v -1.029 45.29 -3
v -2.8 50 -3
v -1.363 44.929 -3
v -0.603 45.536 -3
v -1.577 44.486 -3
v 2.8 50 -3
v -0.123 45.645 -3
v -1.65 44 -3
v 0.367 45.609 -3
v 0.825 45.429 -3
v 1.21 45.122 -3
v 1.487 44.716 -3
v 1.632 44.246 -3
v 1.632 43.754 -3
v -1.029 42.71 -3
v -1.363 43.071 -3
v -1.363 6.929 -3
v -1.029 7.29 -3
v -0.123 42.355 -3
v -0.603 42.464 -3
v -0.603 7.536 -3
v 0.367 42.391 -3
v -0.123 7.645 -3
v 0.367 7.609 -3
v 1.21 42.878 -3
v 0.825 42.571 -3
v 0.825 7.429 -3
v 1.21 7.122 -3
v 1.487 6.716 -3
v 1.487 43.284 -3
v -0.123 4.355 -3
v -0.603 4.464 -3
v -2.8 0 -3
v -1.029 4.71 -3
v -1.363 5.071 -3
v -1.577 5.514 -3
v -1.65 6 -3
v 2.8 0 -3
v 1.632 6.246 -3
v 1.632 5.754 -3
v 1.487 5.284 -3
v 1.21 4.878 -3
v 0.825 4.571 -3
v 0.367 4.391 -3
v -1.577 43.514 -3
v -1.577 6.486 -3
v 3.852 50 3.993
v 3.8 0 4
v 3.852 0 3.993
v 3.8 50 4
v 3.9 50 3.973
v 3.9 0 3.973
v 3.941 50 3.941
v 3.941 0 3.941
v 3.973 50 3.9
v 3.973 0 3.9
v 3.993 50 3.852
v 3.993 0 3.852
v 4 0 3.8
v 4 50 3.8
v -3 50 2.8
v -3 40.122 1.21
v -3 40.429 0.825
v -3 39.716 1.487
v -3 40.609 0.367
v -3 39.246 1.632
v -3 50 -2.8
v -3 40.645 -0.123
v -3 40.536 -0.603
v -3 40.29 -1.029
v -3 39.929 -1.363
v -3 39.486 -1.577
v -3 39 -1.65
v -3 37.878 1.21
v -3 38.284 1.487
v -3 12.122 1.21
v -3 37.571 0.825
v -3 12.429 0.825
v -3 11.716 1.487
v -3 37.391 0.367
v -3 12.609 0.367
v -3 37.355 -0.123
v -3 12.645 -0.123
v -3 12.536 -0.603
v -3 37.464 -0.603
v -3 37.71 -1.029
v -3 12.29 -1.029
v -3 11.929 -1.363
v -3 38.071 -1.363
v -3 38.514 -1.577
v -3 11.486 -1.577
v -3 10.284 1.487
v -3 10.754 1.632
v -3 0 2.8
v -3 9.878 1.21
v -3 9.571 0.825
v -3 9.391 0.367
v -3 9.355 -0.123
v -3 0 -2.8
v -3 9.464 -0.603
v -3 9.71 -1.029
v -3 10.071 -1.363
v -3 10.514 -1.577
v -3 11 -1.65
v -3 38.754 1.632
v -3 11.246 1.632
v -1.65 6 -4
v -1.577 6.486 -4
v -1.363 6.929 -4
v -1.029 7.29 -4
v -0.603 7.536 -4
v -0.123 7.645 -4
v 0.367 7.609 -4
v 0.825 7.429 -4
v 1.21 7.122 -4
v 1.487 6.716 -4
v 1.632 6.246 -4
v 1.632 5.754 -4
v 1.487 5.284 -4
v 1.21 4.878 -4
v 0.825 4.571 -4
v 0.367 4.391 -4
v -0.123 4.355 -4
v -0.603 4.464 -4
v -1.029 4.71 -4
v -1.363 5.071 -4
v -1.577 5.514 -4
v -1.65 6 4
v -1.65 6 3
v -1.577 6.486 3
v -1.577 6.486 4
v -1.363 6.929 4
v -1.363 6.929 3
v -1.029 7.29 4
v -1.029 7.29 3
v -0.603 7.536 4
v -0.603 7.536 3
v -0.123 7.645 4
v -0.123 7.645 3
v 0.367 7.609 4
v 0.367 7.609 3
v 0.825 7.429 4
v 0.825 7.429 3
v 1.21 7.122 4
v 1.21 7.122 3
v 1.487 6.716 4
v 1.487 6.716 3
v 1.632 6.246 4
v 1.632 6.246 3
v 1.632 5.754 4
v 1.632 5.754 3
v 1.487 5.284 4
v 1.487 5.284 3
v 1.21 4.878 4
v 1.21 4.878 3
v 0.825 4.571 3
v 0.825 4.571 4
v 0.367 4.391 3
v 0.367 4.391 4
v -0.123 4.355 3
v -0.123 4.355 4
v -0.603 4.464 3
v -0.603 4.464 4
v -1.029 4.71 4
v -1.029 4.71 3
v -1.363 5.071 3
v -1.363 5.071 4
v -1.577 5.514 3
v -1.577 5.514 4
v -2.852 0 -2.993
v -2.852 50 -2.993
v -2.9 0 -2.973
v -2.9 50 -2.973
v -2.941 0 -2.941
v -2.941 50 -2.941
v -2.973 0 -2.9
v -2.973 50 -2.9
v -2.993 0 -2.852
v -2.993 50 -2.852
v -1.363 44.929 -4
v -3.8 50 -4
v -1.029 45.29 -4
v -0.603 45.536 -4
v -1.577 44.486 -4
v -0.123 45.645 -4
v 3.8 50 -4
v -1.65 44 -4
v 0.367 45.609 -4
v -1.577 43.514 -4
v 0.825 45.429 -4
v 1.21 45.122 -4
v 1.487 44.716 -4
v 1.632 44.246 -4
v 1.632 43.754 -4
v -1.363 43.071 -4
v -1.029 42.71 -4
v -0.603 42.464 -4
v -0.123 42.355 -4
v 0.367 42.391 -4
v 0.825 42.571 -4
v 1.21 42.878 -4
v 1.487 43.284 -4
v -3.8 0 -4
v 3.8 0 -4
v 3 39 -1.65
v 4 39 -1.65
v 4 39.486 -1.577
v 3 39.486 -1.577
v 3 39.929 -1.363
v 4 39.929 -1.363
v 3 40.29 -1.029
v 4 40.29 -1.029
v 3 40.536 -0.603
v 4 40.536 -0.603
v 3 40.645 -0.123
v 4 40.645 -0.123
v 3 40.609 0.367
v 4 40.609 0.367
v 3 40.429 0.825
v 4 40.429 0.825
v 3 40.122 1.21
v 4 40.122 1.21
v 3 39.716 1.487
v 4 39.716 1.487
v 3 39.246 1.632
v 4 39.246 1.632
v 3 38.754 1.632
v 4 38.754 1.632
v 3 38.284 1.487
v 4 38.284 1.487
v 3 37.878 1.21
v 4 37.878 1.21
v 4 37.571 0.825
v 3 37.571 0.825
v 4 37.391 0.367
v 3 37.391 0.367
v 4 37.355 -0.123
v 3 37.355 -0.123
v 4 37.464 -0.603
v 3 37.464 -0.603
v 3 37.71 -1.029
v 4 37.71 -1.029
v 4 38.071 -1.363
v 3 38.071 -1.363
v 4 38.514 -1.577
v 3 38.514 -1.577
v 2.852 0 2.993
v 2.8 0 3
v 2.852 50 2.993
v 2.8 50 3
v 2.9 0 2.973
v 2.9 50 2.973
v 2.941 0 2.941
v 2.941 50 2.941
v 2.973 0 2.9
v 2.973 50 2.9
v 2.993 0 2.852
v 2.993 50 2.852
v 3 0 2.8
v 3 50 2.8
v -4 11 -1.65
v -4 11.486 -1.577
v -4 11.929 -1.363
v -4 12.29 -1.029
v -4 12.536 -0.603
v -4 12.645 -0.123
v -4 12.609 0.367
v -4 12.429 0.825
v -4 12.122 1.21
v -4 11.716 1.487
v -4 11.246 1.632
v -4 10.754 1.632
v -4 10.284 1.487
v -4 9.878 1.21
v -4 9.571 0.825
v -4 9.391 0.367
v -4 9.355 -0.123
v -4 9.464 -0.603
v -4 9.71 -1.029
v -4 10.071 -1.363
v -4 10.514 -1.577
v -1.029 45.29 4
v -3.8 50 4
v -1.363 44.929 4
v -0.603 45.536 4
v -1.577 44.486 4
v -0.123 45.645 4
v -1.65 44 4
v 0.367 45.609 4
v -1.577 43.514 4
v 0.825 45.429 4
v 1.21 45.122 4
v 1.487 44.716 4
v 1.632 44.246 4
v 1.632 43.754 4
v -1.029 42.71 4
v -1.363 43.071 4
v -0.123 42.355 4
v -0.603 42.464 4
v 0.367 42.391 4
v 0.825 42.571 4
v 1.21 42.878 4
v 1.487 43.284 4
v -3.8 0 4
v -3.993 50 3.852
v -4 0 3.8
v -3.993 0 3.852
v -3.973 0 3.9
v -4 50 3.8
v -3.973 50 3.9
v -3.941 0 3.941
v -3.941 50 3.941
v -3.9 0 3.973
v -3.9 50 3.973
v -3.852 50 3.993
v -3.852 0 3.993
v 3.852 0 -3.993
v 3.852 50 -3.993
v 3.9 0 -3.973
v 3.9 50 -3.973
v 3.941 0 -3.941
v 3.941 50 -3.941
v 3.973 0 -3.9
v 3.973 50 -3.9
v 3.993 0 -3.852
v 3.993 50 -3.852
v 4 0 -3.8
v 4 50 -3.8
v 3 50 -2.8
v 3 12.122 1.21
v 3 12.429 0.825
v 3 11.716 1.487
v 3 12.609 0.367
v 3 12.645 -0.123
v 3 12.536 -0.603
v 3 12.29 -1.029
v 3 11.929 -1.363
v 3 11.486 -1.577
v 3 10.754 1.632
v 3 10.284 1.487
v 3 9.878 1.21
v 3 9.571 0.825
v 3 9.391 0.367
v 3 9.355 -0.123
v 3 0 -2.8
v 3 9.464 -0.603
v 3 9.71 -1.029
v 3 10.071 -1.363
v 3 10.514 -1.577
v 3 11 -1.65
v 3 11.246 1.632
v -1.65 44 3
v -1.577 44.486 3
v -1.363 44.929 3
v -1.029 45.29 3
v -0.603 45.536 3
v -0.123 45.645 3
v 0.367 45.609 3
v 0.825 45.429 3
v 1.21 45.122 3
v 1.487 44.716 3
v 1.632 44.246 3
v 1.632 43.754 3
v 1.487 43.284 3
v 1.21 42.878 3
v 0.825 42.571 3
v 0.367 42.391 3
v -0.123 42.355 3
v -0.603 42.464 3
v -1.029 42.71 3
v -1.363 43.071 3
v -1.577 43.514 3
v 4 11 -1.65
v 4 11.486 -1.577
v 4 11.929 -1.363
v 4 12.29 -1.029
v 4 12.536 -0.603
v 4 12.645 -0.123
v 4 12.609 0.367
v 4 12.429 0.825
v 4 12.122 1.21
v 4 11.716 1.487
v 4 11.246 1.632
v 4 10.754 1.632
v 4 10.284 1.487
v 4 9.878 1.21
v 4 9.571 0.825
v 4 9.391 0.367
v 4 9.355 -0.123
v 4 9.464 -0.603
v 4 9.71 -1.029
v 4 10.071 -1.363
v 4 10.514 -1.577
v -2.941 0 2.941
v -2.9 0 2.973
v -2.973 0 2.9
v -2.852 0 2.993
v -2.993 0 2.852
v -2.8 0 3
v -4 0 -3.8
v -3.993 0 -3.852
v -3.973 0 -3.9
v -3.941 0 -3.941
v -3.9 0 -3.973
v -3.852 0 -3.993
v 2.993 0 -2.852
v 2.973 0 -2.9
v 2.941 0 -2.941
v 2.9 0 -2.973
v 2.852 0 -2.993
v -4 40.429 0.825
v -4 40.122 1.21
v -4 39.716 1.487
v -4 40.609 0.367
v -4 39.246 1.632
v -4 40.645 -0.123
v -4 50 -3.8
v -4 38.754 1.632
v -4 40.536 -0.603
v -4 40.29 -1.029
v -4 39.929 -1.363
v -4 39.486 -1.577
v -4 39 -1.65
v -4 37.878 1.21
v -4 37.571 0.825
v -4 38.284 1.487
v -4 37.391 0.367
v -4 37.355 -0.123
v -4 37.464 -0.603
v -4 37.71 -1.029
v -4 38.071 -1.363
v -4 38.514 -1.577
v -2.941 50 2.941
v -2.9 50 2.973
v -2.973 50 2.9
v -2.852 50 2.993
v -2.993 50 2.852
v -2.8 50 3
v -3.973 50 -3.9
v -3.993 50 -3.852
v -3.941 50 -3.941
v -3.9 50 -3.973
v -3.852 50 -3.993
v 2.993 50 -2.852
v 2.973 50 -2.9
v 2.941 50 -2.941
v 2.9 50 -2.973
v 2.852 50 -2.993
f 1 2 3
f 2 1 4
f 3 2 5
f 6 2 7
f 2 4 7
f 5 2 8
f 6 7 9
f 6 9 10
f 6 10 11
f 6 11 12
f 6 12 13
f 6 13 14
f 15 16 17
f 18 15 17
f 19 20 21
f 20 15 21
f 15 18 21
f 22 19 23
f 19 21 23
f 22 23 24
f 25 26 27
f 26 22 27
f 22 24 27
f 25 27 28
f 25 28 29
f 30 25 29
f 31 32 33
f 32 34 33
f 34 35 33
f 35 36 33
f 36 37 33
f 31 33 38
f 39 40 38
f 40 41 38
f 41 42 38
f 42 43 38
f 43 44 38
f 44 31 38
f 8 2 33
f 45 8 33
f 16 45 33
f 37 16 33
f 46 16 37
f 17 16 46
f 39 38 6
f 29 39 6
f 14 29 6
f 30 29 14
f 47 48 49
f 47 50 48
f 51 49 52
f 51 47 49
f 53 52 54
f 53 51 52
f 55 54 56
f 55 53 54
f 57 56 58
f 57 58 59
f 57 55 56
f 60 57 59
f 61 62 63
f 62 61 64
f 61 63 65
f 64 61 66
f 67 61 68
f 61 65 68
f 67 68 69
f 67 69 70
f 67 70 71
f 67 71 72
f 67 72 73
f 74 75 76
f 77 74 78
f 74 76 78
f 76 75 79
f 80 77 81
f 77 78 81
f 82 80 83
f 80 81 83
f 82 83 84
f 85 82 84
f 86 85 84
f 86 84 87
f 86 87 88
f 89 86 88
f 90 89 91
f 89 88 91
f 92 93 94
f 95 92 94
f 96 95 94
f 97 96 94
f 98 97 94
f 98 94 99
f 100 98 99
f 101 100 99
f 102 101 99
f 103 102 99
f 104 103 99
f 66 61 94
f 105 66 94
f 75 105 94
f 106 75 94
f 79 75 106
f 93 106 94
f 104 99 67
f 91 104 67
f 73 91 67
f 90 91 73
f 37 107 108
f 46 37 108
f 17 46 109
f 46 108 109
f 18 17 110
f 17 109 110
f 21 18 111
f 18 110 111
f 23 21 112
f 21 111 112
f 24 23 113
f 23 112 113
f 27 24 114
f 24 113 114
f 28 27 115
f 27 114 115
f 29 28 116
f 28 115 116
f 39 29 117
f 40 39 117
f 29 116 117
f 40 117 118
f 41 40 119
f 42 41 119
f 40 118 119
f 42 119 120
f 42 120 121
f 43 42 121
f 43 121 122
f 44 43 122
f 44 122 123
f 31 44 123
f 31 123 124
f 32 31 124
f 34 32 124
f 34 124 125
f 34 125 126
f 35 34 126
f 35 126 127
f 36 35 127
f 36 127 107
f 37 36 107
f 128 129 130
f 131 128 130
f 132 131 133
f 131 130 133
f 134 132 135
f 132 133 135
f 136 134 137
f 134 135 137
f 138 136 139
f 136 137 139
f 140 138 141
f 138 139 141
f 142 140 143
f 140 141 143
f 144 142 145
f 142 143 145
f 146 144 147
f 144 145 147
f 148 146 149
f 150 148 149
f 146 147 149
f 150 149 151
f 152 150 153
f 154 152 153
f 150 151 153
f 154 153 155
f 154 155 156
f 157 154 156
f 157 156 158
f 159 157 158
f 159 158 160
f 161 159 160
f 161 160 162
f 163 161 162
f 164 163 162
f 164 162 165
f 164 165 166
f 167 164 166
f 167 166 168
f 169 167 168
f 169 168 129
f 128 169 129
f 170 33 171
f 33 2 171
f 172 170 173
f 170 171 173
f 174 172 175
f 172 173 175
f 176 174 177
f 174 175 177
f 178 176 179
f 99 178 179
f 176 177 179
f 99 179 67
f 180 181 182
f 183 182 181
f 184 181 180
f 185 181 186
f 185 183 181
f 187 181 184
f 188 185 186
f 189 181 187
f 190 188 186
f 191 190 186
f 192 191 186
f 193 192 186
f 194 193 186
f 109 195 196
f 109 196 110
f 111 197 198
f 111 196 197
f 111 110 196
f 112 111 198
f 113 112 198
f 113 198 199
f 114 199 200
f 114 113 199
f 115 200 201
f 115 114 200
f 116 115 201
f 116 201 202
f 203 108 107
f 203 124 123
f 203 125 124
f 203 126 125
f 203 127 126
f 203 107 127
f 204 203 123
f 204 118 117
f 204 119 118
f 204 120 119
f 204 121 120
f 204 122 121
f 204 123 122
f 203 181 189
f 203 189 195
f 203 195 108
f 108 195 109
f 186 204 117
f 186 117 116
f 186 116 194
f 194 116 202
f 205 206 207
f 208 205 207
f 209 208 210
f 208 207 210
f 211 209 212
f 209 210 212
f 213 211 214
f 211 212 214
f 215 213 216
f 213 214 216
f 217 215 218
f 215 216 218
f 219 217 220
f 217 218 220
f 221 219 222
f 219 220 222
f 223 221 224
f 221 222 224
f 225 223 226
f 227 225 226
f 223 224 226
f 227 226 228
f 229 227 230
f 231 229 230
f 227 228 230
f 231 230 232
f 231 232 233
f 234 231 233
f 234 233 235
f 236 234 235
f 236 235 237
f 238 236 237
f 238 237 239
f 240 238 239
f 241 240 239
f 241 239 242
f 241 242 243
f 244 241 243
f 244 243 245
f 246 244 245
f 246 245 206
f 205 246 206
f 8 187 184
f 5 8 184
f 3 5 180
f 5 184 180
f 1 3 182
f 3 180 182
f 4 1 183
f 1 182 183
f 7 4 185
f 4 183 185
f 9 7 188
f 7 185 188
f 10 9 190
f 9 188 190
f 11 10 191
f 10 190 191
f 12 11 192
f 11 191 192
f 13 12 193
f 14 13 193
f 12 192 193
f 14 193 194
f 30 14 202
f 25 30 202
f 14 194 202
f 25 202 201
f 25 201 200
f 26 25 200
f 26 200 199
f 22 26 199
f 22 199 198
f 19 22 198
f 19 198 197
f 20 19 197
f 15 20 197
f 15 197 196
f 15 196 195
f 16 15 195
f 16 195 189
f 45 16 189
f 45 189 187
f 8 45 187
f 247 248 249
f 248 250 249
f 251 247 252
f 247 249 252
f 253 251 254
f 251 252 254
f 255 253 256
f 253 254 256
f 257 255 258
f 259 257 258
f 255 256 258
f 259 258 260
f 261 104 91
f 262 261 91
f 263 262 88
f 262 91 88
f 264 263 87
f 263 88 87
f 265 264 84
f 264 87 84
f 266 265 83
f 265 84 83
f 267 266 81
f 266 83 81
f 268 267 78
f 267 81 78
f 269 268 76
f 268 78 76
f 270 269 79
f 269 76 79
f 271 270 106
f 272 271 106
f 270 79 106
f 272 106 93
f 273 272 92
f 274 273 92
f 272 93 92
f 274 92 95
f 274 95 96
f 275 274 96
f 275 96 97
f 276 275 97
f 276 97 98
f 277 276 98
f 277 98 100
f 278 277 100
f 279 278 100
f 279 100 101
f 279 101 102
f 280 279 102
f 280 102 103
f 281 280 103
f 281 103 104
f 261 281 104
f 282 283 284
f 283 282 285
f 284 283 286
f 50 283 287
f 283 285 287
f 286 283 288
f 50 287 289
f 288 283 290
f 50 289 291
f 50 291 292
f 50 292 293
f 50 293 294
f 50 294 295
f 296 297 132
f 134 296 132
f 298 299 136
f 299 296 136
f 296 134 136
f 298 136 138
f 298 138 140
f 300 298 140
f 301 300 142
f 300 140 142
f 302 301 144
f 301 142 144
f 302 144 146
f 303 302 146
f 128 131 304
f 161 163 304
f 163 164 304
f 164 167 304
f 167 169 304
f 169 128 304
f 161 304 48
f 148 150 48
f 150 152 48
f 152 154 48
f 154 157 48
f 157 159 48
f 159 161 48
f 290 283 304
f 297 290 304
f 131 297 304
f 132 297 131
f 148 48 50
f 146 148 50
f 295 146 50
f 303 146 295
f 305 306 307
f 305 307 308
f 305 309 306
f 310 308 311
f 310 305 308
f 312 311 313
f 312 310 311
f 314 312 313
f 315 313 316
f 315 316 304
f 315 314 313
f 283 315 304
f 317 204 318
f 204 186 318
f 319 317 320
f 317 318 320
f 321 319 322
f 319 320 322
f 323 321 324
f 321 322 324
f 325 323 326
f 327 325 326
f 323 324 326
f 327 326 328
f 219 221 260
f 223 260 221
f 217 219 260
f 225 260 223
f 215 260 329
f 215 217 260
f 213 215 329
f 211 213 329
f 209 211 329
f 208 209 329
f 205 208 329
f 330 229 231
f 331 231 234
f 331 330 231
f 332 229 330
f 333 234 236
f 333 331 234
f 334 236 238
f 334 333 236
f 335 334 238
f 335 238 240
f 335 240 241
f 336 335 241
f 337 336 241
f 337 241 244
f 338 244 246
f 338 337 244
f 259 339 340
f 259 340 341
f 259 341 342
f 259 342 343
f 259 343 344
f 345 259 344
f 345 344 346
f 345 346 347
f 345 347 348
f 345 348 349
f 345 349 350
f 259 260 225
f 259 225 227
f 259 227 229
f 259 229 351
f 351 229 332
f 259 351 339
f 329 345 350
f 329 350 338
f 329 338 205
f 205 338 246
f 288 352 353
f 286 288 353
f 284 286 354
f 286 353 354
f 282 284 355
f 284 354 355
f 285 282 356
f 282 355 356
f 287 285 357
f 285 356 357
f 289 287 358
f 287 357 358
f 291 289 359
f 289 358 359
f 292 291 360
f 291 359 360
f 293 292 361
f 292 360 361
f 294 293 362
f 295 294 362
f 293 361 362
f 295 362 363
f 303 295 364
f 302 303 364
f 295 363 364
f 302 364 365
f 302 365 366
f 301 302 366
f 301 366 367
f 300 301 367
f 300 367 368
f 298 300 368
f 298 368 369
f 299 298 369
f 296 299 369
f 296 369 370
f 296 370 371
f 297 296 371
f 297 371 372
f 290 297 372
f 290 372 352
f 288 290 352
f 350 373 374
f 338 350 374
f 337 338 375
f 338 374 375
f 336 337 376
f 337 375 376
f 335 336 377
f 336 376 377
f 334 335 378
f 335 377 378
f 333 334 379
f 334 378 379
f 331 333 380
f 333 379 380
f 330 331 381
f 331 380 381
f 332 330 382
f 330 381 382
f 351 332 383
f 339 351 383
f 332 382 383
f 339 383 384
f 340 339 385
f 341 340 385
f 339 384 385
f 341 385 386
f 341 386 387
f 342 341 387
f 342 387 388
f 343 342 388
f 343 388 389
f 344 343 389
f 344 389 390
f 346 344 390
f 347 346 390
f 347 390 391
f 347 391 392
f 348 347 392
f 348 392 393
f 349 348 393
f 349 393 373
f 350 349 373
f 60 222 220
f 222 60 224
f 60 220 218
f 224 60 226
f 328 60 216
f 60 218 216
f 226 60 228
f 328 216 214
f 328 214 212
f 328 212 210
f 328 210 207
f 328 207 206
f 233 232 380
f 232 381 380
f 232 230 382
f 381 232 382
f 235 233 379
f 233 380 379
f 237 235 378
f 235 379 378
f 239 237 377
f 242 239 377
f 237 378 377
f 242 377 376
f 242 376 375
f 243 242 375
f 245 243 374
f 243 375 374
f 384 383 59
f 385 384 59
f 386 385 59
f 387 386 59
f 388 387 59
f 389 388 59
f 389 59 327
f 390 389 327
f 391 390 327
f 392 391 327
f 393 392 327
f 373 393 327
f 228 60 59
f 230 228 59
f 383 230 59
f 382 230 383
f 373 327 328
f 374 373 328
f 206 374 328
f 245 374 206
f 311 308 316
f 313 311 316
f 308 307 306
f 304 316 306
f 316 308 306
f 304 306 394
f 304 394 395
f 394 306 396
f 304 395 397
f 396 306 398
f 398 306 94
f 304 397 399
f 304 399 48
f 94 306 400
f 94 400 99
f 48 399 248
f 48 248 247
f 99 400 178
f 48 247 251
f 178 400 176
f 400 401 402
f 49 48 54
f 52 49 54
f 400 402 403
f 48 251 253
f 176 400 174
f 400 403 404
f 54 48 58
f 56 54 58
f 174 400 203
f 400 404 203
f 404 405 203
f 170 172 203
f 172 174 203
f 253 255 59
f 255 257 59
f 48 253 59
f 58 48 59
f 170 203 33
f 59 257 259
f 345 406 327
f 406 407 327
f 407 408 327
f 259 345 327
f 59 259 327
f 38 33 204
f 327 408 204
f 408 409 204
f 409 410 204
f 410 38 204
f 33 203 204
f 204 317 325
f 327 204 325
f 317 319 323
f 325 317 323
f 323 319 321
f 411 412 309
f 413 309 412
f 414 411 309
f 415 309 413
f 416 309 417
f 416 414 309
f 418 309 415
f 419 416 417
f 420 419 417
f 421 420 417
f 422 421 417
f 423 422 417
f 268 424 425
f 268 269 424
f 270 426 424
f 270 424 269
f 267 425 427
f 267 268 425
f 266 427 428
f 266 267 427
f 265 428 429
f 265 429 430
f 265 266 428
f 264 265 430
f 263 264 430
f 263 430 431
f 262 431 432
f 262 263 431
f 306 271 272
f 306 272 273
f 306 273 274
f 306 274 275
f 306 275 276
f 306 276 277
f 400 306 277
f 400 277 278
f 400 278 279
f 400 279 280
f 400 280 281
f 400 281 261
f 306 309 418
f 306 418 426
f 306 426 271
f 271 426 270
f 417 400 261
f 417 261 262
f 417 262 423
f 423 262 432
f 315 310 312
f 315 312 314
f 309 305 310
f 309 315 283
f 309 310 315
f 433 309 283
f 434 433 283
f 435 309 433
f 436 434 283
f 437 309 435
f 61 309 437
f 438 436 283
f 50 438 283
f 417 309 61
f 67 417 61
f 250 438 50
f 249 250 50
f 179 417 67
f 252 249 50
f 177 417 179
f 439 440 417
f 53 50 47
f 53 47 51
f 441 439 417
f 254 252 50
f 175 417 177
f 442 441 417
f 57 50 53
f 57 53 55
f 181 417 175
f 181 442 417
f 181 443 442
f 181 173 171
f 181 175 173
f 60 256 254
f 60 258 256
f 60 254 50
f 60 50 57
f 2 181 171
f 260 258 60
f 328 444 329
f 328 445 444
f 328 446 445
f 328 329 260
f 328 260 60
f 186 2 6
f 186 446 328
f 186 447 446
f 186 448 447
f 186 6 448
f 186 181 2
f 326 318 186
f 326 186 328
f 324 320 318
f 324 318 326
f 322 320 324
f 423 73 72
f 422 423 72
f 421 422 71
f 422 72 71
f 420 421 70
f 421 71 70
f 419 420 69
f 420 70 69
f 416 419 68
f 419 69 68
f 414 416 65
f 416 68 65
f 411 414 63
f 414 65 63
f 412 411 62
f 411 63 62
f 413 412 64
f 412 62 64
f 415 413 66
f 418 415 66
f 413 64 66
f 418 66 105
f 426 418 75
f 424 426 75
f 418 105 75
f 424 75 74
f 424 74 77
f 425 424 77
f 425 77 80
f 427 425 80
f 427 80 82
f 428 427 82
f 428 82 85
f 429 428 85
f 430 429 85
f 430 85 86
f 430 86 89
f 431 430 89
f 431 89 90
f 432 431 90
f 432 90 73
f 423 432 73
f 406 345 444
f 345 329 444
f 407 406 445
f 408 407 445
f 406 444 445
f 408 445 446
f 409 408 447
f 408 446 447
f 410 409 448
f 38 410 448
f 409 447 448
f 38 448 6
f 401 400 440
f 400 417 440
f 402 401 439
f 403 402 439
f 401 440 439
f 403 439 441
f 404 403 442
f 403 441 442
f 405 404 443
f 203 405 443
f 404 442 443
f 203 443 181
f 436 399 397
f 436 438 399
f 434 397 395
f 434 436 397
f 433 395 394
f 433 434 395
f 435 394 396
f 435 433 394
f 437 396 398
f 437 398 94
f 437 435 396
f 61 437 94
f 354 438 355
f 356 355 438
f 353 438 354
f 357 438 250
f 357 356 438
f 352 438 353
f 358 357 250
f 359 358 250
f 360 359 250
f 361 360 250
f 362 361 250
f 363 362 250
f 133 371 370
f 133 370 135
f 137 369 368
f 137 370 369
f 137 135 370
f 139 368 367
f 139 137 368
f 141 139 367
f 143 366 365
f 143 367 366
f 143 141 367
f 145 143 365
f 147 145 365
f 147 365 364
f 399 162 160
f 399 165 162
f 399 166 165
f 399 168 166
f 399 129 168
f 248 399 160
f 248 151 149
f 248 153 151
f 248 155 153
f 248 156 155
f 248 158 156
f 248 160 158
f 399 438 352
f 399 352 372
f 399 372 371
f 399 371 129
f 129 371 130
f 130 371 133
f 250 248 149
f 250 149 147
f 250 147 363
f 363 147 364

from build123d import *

# Parameters (mm, degrees)
SKETCH_1_W          = 8
SKETCH_1_H          = 8
SKETCH_1_W_2        = 6
SKETCH_1_H_2        = 6
EXTRUDE_1_DEPTH     = 50
FILLET_1_R          = 0.2
FILLET_2_R          = 0.2
SKETCH_3_R          = 1.65
CUT_EXTRUDE_1_DEPTH = 50
SKETCH_4_R          = 1.65
CUT_EXTRUDE_2_DEPTH = 50


with BuildPart() as part:
    # 草图1 → 凸台-拉伸1 (new body)
    with BuildSketch(Plane(origin=(0, 0, 0), x_dir=(1, 0, 0), z_dir=(0, 1, 0))):
        Rectangle(SKETCH_1_W, SKETCH_1_H)
        Rectangle(SKETCH_1_W_2, SKETCH_1_H_2, mode=Mode.SUBTRACT)
    extrude(amount=EXTRUDE_1_DEPTH)

    # 圆角1
    fillet_1_edges = [part.edges().sort_by_distance(p)[0] for p in [
        (3, 25, 3),
        (3, 25, -3),
        (-3, 25, -3),
        (-3, 25, 3),
    ]]
    fillet(fillet_1_edges, radius=FILLET_1_R)

    # 圆角2
    fillet_2_edges = [part.edges().sort_by_distance(p)[0] for p in [
        (4, 25, 4),
        (-4, 25, 4),
        (-4, 25, -4),
        (4, 25, -4),
    ]]
    fillet(fillet_2_edges, radius=FILLET_2_R)

    # 草图3 → 切除-拉伸1 (cut)
    with BuildSketch(Plane(origin=(4, 0, 0), x_dir=(0, 0, -1), z_dir=(1, 0, 0))):
        with Locations((0, 39)):
            Circle(SKETCH_3_R)
        with Locations((0, 11)):
            Circle(SKETCH_3_R)
    extrude(amount=-CUT_EXTRUDE_1_DEPTH, mode=Mode.SUBTRACT)

    # 草图4 → 切除-拉伸2 (cut)
    with BuildSketch(Plane(origin=(0, 0, -4), x_dir=(-1, 0, 0), z_dir=(0, 0, -1))):
        with Locations((0, 44)):
            Circle(SKETCH_4_R)
        with Locations((0, 6)):
            Circle(SKETCH_4_R)
    extrude(amount=-CUT_EXTRUDE_2_DEPTH, mode=Mode.SUBTRACT)


solid = part.part
